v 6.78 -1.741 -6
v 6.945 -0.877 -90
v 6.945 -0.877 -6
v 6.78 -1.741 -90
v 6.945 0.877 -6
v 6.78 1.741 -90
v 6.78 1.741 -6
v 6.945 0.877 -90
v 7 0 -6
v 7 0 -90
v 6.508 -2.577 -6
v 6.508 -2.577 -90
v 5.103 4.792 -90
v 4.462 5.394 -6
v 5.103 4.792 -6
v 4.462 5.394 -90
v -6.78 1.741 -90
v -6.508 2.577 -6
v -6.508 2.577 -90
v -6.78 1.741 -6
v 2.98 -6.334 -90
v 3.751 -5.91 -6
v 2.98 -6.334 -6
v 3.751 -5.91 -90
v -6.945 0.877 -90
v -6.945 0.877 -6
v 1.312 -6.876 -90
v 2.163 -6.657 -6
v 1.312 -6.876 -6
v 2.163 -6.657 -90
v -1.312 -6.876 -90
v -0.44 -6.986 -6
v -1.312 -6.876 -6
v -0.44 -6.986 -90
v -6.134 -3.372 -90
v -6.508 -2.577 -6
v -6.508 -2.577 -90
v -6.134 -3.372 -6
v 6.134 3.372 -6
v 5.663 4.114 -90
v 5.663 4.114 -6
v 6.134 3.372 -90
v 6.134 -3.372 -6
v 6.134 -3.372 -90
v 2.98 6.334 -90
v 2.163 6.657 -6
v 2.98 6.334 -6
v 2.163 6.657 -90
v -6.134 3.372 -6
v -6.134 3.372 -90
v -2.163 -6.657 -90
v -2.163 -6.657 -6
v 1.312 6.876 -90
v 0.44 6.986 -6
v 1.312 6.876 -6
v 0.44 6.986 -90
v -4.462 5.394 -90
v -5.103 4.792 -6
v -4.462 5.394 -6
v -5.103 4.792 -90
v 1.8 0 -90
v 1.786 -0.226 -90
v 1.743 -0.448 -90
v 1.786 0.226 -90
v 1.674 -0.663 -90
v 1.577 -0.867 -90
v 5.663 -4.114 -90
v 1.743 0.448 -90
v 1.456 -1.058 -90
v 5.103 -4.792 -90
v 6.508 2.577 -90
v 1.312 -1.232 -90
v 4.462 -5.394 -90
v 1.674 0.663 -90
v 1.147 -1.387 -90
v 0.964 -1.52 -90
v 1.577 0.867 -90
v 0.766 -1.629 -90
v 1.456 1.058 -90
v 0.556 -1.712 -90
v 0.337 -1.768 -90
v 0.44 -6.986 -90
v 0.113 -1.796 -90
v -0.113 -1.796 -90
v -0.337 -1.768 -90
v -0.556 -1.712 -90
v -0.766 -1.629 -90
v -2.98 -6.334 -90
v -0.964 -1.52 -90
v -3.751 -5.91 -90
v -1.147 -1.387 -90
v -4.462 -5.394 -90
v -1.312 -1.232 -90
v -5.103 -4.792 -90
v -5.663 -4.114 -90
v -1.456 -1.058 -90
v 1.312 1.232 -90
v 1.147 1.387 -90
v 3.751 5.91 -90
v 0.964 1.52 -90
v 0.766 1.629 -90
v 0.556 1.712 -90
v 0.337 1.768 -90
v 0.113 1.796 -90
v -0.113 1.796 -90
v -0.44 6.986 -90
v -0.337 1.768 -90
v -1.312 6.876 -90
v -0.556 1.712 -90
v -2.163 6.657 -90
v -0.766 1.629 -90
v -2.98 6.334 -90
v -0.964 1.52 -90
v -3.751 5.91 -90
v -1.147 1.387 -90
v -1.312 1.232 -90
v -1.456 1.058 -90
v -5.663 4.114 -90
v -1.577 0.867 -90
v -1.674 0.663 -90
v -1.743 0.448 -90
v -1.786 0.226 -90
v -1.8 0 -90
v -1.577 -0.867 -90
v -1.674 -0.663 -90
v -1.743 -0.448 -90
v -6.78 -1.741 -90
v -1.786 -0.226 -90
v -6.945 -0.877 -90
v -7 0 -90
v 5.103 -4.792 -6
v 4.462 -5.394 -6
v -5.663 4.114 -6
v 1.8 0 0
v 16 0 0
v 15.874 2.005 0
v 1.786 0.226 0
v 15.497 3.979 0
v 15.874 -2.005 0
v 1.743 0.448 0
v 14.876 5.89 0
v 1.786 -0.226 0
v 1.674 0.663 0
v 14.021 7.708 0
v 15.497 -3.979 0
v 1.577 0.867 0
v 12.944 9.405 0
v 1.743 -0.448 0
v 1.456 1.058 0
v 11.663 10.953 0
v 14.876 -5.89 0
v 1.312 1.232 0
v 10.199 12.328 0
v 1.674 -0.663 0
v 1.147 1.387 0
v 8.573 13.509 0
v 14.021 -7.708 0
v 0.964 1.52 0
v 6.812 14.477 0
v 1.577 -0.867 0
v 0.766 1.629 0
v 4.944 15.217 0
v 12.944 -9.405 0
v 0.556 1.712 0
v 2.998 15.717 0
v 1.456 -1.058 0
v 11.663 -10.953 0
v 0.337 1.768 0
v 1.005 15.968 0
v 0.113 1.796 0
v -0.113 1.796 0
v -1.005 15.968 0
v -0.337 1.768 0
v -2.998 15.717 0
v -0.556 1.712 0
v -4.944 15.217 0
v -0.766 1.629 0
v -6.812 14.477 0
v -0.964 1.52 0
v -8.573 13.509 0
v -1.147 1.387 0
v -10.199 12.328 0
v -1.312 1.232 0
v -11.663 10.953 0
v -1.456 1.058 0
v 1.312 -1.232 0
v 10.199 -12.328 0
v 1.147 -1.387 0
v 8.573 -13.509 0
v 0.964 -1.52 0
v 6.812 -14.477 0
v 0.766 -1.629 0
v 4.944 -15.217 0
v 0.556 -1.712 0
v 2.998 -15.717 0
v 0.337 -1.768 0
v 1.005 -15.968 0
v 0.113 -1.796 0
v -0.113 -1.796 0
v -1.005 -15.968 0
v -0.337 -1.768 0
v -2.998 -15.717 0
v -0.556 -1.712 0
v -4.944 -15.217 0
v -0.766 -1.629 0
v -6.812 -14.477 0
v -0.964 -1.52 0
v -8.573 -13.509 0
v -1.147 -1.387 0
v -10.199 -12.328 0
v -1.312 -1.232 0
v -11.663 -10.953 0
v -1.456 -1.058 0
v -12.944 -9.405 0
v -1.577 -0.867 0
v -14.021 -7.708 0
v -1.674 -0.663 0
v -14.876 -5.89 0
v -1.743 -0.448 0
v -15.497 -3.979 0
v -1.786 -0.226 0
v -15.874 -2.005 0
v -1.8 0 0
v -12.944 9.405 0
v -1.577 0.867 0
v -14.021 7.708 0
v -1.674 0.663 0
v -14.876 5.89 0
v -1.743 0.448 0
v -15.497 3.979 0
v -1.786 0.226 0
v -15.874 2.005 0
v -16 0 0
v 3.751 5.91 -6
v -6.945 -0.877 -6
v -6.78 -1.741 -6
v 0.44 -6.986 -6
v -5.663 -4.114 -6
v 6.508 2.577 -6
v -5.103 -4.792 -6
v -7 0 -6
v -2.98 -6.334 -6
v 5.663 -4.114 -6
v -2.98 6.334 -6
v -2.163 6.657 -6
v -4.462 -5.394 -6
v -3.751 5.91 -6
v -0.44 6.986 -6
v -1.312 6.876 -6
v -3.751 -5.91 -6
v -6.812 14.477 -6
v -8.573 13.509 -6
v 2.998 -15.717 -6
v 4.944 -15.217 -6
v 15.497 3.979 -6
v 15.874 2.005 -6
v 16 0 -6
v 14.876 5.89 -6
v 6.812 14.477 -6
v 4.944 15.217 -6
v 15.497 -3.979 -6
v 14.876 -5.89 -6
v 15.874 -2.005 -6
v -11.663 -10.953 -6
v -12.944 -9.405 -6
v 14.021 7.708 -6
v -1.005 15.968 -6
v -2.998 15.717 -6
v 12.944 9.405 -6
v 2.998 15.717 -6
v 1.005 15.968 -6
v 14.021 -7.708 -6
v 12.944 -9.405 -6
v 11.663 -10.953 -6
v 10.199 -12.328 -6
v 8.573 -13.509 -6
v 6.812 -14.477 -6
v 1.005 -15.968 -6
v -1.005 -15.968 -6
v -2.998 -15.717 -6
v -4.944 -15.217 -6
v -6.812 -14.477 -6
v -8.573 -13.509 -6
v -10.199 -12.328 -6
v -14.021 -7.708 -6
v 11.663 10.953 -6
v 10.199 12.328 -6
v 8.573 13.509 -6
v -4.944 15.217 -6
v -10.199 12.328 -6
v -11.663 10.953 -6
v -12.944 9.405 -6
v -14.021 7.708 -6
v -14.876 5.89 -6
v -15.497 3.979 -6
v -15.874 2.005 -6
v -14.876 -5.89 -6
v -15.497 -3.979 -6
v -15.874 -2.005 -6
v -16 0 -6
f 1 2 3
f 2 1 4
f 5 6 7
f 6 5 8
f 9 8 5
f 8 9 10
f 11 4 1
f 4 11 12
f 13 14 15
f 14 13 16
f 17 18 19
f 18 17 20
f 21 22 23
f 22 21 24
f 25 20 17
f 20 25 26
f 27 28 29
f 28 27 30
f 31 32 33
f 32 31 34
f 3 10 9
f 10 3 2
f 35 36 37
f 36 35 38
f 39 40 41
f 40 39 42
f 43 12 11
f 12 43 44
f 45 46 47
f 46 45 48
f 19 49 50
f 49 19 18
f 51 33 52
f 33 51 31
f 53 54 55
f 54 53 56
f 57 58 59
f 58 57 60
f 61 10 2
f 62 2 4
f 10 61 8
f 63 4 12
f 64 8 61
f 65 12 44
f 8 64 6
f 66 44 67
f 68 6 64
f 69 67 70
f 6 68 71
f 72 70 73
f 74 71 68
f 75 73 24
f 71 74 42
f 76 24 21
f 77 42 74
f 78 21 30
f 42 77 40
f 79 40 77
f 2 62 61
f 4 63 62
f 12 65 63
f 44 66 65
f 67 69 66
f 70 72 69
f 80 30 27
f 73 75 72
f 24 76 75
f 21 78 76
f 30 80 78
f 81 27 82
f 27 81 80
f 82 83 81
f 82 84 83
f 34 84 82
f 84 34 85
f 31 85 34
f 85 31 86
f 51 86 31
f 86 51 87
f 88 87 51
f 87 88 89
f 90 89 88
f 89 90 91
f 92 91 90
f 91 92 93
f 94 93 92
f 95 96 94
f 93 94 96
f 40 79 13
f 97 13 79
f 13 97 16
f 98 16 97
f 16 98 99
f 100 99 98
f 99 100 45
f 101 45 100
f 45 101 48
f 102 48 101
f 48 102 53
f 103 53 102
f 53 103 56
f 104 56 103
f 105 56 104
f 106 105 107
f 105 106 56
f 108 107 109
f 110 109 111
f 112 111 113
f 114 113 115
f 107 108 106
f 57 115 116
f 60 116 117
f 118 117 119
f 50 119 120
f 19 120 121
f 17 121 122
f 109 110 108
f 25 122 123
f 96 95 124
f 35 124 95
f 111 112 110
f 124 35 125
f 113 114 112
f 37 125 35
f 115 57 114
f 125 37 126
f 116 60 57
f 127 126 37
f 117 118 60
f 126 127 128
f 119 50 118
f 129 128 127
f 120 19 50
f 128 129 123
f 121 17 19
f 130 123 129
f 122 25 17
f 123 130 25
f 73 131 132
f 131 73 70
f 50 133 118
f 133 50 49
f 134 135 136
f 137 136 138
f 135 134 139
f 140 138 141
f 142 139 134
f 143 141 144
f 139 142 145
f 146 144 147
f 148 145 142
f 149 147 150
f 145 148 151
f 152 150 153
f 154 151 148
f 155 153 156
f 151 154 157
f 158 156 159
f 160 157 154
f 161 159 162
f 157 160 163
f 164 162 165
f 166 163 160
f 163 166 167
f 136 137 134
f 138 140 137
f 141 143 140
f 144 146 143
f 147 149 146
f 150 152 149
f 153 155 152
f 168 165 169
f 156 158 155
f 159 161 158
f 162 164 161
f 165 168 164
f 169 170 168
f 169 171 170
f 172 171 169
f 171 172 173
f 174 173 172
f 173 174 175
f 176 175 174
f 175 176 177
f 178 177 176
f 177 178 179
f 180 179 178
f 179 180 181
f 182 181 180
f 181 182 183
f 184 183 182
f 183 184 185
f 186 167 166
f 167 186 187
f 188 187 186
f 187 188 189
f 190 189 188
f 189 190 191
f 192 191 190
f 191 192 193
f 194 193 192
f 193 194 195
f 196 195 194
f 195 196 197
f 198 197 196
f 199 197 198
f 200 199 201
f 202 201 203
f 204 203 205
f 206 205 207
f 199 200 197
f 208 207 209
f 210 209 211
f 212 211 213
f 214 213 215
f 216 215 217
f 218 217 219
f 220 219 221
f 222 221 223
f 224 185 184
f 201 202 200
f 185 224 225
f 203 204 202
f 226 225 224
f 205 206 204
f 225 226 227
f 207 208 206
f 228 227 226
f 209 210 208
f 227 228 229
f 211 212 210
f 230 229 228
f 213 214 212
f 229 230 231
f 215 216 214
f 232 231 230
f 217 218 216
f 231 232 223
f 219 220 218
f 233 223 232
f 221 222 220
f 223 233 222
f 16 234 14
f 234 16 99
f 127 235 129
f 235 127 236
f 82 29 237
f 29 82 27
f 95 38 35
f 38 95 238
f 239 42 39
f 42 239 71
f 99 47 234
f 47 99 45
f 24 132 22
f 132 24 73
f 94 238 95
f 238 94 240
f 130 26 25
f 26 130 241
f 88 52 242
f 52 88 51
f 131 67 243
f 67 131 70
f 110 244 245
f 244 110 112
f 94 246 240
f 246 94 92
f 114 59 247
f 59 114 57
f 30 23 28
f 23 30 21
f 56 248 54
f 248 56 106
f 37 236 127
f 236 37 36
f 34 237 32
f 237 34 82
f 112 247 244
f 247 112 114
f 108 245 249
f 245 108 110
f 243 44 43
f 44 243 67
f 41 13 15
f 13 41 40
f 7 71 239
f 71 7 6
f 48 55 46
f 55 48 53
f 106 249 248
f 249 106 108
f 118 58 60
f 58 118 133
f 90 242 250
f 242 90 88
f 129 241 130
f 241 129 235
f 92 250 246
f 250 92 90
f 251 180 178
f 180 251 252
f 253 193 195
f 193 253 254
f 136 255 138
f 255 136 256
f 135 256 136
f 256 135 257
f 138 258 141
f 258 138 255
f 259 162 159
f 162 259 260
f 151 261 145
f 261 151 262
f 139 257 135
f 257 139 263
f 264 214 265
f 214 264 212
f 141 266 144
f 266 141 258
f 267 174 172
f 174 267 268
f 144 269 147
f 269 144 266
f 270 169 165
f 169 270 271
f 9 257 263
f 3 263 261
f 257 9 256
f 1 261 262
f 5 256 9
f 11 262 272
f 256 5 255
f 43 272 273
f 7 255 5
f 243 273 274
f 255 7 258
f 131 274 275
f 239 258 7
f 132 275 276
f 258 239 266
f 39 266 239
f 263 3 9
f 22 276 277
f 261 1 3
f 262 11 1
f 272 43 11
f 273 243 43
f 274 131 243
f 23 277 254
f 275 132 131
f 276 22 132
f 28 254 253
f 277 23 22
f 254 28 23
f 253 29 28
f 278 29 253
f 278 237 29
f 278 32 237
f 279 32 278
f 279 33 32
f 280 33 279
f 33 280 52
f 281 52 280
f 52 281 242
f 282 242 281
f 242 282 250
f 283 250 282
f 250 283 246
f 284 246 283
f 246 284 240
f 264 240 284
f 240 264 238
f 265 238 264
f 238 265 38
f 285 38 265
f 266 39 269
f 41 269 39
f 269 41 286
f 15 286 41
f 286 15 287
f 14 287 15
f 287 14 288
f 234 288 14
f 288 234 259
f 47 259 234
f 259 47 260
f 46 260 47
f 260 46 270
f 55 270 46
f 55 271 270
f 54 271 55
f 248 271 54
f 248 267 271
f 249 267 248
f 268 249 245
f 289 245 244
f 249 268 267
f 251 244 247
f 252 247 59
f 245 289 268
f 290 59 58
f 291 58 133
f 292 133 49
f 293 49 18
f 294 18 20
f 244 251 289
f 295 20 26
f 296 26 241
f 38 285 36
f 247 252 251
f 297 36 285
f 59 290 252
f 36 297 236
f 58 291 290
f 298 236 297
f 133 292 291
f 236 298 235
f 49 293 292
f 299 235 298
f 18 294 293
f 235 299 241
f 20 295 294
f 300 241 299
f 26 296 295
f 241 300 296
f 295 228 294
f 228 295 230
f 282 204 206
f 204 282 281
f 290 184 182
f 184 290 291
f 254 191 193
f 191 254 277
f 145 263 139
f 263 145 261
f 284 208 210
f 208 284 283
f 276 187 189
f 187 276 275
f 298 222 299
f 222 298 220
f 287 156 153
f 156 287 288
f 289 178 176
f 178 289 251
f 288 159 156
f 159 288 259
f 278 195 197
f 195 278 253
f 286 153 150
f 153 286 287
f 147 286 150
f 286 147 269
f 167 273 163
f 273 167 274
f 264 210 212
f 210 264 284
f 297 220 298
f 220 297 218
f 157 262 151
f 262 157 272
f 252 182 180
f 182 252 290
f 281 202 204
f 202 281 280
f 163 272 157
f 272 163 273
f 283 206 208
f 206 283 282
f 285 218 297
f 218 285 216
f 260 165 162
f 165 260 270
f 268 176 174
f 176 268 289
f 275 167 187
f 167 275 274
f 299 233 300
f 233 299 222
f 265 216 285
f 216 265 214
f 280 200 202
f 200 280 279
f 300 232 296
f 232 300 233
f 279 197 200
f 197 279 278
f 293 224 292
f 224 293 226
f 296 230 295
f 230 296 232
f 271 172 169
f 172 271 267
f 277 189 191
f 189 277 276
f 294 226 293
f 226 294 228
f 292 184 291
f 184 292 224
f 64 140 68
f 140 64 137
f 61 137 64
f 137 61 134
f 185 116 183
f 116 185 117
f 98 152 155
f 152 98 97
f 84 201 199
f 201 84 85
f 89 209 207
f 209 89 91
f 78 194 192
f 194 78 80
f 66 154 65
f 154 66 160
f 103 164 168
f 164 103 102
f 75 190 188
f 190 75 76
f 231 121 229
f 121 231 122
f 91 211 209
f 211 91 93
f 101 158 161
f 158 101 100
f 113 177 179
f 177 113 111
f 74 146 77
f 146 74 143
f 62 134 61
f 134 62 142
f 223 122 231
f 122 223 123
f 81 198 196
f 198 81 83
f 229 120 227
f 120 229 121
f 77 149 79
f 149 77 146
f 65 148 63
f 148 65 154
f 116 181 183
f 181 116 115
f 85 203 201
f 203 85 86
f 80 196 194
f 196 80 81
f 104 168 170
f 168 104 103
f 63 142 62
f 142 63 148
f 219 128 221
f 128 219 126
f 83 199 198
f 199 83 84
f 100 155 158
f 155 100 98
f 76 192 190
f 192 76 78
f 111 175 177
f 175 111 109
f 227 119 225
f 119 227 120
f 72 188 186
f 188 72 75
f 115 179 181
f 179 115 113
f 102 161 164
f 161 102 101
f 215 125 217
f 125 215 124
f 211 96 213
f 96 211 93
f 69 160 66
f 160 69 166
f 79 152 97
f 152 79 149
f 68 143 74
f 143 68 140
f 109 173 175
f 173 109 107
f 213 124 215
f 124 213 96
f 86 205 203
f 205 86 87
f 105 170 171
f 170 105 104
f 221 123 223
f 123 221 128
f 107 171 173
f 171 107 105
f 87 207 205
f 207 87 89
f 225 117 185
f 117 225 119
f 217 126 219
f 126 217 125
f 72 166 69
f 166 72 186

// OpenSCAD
$fn = 50;


difference() {
	union() {
		translate(v = [0, 0, -90.0000000000]) {
			cylinder(h = 90, r = 7.0000000000);
		}
		translate(v = [0, 0, -6.0000000000]) {
			cylinder(h = 6, r = 16.0000000000);
		}
	}
	union() {
		#translate(v = [0, 0, -90]) {
			cylinder(h = 90, r = 1.8000000000);
		}
	}
}
